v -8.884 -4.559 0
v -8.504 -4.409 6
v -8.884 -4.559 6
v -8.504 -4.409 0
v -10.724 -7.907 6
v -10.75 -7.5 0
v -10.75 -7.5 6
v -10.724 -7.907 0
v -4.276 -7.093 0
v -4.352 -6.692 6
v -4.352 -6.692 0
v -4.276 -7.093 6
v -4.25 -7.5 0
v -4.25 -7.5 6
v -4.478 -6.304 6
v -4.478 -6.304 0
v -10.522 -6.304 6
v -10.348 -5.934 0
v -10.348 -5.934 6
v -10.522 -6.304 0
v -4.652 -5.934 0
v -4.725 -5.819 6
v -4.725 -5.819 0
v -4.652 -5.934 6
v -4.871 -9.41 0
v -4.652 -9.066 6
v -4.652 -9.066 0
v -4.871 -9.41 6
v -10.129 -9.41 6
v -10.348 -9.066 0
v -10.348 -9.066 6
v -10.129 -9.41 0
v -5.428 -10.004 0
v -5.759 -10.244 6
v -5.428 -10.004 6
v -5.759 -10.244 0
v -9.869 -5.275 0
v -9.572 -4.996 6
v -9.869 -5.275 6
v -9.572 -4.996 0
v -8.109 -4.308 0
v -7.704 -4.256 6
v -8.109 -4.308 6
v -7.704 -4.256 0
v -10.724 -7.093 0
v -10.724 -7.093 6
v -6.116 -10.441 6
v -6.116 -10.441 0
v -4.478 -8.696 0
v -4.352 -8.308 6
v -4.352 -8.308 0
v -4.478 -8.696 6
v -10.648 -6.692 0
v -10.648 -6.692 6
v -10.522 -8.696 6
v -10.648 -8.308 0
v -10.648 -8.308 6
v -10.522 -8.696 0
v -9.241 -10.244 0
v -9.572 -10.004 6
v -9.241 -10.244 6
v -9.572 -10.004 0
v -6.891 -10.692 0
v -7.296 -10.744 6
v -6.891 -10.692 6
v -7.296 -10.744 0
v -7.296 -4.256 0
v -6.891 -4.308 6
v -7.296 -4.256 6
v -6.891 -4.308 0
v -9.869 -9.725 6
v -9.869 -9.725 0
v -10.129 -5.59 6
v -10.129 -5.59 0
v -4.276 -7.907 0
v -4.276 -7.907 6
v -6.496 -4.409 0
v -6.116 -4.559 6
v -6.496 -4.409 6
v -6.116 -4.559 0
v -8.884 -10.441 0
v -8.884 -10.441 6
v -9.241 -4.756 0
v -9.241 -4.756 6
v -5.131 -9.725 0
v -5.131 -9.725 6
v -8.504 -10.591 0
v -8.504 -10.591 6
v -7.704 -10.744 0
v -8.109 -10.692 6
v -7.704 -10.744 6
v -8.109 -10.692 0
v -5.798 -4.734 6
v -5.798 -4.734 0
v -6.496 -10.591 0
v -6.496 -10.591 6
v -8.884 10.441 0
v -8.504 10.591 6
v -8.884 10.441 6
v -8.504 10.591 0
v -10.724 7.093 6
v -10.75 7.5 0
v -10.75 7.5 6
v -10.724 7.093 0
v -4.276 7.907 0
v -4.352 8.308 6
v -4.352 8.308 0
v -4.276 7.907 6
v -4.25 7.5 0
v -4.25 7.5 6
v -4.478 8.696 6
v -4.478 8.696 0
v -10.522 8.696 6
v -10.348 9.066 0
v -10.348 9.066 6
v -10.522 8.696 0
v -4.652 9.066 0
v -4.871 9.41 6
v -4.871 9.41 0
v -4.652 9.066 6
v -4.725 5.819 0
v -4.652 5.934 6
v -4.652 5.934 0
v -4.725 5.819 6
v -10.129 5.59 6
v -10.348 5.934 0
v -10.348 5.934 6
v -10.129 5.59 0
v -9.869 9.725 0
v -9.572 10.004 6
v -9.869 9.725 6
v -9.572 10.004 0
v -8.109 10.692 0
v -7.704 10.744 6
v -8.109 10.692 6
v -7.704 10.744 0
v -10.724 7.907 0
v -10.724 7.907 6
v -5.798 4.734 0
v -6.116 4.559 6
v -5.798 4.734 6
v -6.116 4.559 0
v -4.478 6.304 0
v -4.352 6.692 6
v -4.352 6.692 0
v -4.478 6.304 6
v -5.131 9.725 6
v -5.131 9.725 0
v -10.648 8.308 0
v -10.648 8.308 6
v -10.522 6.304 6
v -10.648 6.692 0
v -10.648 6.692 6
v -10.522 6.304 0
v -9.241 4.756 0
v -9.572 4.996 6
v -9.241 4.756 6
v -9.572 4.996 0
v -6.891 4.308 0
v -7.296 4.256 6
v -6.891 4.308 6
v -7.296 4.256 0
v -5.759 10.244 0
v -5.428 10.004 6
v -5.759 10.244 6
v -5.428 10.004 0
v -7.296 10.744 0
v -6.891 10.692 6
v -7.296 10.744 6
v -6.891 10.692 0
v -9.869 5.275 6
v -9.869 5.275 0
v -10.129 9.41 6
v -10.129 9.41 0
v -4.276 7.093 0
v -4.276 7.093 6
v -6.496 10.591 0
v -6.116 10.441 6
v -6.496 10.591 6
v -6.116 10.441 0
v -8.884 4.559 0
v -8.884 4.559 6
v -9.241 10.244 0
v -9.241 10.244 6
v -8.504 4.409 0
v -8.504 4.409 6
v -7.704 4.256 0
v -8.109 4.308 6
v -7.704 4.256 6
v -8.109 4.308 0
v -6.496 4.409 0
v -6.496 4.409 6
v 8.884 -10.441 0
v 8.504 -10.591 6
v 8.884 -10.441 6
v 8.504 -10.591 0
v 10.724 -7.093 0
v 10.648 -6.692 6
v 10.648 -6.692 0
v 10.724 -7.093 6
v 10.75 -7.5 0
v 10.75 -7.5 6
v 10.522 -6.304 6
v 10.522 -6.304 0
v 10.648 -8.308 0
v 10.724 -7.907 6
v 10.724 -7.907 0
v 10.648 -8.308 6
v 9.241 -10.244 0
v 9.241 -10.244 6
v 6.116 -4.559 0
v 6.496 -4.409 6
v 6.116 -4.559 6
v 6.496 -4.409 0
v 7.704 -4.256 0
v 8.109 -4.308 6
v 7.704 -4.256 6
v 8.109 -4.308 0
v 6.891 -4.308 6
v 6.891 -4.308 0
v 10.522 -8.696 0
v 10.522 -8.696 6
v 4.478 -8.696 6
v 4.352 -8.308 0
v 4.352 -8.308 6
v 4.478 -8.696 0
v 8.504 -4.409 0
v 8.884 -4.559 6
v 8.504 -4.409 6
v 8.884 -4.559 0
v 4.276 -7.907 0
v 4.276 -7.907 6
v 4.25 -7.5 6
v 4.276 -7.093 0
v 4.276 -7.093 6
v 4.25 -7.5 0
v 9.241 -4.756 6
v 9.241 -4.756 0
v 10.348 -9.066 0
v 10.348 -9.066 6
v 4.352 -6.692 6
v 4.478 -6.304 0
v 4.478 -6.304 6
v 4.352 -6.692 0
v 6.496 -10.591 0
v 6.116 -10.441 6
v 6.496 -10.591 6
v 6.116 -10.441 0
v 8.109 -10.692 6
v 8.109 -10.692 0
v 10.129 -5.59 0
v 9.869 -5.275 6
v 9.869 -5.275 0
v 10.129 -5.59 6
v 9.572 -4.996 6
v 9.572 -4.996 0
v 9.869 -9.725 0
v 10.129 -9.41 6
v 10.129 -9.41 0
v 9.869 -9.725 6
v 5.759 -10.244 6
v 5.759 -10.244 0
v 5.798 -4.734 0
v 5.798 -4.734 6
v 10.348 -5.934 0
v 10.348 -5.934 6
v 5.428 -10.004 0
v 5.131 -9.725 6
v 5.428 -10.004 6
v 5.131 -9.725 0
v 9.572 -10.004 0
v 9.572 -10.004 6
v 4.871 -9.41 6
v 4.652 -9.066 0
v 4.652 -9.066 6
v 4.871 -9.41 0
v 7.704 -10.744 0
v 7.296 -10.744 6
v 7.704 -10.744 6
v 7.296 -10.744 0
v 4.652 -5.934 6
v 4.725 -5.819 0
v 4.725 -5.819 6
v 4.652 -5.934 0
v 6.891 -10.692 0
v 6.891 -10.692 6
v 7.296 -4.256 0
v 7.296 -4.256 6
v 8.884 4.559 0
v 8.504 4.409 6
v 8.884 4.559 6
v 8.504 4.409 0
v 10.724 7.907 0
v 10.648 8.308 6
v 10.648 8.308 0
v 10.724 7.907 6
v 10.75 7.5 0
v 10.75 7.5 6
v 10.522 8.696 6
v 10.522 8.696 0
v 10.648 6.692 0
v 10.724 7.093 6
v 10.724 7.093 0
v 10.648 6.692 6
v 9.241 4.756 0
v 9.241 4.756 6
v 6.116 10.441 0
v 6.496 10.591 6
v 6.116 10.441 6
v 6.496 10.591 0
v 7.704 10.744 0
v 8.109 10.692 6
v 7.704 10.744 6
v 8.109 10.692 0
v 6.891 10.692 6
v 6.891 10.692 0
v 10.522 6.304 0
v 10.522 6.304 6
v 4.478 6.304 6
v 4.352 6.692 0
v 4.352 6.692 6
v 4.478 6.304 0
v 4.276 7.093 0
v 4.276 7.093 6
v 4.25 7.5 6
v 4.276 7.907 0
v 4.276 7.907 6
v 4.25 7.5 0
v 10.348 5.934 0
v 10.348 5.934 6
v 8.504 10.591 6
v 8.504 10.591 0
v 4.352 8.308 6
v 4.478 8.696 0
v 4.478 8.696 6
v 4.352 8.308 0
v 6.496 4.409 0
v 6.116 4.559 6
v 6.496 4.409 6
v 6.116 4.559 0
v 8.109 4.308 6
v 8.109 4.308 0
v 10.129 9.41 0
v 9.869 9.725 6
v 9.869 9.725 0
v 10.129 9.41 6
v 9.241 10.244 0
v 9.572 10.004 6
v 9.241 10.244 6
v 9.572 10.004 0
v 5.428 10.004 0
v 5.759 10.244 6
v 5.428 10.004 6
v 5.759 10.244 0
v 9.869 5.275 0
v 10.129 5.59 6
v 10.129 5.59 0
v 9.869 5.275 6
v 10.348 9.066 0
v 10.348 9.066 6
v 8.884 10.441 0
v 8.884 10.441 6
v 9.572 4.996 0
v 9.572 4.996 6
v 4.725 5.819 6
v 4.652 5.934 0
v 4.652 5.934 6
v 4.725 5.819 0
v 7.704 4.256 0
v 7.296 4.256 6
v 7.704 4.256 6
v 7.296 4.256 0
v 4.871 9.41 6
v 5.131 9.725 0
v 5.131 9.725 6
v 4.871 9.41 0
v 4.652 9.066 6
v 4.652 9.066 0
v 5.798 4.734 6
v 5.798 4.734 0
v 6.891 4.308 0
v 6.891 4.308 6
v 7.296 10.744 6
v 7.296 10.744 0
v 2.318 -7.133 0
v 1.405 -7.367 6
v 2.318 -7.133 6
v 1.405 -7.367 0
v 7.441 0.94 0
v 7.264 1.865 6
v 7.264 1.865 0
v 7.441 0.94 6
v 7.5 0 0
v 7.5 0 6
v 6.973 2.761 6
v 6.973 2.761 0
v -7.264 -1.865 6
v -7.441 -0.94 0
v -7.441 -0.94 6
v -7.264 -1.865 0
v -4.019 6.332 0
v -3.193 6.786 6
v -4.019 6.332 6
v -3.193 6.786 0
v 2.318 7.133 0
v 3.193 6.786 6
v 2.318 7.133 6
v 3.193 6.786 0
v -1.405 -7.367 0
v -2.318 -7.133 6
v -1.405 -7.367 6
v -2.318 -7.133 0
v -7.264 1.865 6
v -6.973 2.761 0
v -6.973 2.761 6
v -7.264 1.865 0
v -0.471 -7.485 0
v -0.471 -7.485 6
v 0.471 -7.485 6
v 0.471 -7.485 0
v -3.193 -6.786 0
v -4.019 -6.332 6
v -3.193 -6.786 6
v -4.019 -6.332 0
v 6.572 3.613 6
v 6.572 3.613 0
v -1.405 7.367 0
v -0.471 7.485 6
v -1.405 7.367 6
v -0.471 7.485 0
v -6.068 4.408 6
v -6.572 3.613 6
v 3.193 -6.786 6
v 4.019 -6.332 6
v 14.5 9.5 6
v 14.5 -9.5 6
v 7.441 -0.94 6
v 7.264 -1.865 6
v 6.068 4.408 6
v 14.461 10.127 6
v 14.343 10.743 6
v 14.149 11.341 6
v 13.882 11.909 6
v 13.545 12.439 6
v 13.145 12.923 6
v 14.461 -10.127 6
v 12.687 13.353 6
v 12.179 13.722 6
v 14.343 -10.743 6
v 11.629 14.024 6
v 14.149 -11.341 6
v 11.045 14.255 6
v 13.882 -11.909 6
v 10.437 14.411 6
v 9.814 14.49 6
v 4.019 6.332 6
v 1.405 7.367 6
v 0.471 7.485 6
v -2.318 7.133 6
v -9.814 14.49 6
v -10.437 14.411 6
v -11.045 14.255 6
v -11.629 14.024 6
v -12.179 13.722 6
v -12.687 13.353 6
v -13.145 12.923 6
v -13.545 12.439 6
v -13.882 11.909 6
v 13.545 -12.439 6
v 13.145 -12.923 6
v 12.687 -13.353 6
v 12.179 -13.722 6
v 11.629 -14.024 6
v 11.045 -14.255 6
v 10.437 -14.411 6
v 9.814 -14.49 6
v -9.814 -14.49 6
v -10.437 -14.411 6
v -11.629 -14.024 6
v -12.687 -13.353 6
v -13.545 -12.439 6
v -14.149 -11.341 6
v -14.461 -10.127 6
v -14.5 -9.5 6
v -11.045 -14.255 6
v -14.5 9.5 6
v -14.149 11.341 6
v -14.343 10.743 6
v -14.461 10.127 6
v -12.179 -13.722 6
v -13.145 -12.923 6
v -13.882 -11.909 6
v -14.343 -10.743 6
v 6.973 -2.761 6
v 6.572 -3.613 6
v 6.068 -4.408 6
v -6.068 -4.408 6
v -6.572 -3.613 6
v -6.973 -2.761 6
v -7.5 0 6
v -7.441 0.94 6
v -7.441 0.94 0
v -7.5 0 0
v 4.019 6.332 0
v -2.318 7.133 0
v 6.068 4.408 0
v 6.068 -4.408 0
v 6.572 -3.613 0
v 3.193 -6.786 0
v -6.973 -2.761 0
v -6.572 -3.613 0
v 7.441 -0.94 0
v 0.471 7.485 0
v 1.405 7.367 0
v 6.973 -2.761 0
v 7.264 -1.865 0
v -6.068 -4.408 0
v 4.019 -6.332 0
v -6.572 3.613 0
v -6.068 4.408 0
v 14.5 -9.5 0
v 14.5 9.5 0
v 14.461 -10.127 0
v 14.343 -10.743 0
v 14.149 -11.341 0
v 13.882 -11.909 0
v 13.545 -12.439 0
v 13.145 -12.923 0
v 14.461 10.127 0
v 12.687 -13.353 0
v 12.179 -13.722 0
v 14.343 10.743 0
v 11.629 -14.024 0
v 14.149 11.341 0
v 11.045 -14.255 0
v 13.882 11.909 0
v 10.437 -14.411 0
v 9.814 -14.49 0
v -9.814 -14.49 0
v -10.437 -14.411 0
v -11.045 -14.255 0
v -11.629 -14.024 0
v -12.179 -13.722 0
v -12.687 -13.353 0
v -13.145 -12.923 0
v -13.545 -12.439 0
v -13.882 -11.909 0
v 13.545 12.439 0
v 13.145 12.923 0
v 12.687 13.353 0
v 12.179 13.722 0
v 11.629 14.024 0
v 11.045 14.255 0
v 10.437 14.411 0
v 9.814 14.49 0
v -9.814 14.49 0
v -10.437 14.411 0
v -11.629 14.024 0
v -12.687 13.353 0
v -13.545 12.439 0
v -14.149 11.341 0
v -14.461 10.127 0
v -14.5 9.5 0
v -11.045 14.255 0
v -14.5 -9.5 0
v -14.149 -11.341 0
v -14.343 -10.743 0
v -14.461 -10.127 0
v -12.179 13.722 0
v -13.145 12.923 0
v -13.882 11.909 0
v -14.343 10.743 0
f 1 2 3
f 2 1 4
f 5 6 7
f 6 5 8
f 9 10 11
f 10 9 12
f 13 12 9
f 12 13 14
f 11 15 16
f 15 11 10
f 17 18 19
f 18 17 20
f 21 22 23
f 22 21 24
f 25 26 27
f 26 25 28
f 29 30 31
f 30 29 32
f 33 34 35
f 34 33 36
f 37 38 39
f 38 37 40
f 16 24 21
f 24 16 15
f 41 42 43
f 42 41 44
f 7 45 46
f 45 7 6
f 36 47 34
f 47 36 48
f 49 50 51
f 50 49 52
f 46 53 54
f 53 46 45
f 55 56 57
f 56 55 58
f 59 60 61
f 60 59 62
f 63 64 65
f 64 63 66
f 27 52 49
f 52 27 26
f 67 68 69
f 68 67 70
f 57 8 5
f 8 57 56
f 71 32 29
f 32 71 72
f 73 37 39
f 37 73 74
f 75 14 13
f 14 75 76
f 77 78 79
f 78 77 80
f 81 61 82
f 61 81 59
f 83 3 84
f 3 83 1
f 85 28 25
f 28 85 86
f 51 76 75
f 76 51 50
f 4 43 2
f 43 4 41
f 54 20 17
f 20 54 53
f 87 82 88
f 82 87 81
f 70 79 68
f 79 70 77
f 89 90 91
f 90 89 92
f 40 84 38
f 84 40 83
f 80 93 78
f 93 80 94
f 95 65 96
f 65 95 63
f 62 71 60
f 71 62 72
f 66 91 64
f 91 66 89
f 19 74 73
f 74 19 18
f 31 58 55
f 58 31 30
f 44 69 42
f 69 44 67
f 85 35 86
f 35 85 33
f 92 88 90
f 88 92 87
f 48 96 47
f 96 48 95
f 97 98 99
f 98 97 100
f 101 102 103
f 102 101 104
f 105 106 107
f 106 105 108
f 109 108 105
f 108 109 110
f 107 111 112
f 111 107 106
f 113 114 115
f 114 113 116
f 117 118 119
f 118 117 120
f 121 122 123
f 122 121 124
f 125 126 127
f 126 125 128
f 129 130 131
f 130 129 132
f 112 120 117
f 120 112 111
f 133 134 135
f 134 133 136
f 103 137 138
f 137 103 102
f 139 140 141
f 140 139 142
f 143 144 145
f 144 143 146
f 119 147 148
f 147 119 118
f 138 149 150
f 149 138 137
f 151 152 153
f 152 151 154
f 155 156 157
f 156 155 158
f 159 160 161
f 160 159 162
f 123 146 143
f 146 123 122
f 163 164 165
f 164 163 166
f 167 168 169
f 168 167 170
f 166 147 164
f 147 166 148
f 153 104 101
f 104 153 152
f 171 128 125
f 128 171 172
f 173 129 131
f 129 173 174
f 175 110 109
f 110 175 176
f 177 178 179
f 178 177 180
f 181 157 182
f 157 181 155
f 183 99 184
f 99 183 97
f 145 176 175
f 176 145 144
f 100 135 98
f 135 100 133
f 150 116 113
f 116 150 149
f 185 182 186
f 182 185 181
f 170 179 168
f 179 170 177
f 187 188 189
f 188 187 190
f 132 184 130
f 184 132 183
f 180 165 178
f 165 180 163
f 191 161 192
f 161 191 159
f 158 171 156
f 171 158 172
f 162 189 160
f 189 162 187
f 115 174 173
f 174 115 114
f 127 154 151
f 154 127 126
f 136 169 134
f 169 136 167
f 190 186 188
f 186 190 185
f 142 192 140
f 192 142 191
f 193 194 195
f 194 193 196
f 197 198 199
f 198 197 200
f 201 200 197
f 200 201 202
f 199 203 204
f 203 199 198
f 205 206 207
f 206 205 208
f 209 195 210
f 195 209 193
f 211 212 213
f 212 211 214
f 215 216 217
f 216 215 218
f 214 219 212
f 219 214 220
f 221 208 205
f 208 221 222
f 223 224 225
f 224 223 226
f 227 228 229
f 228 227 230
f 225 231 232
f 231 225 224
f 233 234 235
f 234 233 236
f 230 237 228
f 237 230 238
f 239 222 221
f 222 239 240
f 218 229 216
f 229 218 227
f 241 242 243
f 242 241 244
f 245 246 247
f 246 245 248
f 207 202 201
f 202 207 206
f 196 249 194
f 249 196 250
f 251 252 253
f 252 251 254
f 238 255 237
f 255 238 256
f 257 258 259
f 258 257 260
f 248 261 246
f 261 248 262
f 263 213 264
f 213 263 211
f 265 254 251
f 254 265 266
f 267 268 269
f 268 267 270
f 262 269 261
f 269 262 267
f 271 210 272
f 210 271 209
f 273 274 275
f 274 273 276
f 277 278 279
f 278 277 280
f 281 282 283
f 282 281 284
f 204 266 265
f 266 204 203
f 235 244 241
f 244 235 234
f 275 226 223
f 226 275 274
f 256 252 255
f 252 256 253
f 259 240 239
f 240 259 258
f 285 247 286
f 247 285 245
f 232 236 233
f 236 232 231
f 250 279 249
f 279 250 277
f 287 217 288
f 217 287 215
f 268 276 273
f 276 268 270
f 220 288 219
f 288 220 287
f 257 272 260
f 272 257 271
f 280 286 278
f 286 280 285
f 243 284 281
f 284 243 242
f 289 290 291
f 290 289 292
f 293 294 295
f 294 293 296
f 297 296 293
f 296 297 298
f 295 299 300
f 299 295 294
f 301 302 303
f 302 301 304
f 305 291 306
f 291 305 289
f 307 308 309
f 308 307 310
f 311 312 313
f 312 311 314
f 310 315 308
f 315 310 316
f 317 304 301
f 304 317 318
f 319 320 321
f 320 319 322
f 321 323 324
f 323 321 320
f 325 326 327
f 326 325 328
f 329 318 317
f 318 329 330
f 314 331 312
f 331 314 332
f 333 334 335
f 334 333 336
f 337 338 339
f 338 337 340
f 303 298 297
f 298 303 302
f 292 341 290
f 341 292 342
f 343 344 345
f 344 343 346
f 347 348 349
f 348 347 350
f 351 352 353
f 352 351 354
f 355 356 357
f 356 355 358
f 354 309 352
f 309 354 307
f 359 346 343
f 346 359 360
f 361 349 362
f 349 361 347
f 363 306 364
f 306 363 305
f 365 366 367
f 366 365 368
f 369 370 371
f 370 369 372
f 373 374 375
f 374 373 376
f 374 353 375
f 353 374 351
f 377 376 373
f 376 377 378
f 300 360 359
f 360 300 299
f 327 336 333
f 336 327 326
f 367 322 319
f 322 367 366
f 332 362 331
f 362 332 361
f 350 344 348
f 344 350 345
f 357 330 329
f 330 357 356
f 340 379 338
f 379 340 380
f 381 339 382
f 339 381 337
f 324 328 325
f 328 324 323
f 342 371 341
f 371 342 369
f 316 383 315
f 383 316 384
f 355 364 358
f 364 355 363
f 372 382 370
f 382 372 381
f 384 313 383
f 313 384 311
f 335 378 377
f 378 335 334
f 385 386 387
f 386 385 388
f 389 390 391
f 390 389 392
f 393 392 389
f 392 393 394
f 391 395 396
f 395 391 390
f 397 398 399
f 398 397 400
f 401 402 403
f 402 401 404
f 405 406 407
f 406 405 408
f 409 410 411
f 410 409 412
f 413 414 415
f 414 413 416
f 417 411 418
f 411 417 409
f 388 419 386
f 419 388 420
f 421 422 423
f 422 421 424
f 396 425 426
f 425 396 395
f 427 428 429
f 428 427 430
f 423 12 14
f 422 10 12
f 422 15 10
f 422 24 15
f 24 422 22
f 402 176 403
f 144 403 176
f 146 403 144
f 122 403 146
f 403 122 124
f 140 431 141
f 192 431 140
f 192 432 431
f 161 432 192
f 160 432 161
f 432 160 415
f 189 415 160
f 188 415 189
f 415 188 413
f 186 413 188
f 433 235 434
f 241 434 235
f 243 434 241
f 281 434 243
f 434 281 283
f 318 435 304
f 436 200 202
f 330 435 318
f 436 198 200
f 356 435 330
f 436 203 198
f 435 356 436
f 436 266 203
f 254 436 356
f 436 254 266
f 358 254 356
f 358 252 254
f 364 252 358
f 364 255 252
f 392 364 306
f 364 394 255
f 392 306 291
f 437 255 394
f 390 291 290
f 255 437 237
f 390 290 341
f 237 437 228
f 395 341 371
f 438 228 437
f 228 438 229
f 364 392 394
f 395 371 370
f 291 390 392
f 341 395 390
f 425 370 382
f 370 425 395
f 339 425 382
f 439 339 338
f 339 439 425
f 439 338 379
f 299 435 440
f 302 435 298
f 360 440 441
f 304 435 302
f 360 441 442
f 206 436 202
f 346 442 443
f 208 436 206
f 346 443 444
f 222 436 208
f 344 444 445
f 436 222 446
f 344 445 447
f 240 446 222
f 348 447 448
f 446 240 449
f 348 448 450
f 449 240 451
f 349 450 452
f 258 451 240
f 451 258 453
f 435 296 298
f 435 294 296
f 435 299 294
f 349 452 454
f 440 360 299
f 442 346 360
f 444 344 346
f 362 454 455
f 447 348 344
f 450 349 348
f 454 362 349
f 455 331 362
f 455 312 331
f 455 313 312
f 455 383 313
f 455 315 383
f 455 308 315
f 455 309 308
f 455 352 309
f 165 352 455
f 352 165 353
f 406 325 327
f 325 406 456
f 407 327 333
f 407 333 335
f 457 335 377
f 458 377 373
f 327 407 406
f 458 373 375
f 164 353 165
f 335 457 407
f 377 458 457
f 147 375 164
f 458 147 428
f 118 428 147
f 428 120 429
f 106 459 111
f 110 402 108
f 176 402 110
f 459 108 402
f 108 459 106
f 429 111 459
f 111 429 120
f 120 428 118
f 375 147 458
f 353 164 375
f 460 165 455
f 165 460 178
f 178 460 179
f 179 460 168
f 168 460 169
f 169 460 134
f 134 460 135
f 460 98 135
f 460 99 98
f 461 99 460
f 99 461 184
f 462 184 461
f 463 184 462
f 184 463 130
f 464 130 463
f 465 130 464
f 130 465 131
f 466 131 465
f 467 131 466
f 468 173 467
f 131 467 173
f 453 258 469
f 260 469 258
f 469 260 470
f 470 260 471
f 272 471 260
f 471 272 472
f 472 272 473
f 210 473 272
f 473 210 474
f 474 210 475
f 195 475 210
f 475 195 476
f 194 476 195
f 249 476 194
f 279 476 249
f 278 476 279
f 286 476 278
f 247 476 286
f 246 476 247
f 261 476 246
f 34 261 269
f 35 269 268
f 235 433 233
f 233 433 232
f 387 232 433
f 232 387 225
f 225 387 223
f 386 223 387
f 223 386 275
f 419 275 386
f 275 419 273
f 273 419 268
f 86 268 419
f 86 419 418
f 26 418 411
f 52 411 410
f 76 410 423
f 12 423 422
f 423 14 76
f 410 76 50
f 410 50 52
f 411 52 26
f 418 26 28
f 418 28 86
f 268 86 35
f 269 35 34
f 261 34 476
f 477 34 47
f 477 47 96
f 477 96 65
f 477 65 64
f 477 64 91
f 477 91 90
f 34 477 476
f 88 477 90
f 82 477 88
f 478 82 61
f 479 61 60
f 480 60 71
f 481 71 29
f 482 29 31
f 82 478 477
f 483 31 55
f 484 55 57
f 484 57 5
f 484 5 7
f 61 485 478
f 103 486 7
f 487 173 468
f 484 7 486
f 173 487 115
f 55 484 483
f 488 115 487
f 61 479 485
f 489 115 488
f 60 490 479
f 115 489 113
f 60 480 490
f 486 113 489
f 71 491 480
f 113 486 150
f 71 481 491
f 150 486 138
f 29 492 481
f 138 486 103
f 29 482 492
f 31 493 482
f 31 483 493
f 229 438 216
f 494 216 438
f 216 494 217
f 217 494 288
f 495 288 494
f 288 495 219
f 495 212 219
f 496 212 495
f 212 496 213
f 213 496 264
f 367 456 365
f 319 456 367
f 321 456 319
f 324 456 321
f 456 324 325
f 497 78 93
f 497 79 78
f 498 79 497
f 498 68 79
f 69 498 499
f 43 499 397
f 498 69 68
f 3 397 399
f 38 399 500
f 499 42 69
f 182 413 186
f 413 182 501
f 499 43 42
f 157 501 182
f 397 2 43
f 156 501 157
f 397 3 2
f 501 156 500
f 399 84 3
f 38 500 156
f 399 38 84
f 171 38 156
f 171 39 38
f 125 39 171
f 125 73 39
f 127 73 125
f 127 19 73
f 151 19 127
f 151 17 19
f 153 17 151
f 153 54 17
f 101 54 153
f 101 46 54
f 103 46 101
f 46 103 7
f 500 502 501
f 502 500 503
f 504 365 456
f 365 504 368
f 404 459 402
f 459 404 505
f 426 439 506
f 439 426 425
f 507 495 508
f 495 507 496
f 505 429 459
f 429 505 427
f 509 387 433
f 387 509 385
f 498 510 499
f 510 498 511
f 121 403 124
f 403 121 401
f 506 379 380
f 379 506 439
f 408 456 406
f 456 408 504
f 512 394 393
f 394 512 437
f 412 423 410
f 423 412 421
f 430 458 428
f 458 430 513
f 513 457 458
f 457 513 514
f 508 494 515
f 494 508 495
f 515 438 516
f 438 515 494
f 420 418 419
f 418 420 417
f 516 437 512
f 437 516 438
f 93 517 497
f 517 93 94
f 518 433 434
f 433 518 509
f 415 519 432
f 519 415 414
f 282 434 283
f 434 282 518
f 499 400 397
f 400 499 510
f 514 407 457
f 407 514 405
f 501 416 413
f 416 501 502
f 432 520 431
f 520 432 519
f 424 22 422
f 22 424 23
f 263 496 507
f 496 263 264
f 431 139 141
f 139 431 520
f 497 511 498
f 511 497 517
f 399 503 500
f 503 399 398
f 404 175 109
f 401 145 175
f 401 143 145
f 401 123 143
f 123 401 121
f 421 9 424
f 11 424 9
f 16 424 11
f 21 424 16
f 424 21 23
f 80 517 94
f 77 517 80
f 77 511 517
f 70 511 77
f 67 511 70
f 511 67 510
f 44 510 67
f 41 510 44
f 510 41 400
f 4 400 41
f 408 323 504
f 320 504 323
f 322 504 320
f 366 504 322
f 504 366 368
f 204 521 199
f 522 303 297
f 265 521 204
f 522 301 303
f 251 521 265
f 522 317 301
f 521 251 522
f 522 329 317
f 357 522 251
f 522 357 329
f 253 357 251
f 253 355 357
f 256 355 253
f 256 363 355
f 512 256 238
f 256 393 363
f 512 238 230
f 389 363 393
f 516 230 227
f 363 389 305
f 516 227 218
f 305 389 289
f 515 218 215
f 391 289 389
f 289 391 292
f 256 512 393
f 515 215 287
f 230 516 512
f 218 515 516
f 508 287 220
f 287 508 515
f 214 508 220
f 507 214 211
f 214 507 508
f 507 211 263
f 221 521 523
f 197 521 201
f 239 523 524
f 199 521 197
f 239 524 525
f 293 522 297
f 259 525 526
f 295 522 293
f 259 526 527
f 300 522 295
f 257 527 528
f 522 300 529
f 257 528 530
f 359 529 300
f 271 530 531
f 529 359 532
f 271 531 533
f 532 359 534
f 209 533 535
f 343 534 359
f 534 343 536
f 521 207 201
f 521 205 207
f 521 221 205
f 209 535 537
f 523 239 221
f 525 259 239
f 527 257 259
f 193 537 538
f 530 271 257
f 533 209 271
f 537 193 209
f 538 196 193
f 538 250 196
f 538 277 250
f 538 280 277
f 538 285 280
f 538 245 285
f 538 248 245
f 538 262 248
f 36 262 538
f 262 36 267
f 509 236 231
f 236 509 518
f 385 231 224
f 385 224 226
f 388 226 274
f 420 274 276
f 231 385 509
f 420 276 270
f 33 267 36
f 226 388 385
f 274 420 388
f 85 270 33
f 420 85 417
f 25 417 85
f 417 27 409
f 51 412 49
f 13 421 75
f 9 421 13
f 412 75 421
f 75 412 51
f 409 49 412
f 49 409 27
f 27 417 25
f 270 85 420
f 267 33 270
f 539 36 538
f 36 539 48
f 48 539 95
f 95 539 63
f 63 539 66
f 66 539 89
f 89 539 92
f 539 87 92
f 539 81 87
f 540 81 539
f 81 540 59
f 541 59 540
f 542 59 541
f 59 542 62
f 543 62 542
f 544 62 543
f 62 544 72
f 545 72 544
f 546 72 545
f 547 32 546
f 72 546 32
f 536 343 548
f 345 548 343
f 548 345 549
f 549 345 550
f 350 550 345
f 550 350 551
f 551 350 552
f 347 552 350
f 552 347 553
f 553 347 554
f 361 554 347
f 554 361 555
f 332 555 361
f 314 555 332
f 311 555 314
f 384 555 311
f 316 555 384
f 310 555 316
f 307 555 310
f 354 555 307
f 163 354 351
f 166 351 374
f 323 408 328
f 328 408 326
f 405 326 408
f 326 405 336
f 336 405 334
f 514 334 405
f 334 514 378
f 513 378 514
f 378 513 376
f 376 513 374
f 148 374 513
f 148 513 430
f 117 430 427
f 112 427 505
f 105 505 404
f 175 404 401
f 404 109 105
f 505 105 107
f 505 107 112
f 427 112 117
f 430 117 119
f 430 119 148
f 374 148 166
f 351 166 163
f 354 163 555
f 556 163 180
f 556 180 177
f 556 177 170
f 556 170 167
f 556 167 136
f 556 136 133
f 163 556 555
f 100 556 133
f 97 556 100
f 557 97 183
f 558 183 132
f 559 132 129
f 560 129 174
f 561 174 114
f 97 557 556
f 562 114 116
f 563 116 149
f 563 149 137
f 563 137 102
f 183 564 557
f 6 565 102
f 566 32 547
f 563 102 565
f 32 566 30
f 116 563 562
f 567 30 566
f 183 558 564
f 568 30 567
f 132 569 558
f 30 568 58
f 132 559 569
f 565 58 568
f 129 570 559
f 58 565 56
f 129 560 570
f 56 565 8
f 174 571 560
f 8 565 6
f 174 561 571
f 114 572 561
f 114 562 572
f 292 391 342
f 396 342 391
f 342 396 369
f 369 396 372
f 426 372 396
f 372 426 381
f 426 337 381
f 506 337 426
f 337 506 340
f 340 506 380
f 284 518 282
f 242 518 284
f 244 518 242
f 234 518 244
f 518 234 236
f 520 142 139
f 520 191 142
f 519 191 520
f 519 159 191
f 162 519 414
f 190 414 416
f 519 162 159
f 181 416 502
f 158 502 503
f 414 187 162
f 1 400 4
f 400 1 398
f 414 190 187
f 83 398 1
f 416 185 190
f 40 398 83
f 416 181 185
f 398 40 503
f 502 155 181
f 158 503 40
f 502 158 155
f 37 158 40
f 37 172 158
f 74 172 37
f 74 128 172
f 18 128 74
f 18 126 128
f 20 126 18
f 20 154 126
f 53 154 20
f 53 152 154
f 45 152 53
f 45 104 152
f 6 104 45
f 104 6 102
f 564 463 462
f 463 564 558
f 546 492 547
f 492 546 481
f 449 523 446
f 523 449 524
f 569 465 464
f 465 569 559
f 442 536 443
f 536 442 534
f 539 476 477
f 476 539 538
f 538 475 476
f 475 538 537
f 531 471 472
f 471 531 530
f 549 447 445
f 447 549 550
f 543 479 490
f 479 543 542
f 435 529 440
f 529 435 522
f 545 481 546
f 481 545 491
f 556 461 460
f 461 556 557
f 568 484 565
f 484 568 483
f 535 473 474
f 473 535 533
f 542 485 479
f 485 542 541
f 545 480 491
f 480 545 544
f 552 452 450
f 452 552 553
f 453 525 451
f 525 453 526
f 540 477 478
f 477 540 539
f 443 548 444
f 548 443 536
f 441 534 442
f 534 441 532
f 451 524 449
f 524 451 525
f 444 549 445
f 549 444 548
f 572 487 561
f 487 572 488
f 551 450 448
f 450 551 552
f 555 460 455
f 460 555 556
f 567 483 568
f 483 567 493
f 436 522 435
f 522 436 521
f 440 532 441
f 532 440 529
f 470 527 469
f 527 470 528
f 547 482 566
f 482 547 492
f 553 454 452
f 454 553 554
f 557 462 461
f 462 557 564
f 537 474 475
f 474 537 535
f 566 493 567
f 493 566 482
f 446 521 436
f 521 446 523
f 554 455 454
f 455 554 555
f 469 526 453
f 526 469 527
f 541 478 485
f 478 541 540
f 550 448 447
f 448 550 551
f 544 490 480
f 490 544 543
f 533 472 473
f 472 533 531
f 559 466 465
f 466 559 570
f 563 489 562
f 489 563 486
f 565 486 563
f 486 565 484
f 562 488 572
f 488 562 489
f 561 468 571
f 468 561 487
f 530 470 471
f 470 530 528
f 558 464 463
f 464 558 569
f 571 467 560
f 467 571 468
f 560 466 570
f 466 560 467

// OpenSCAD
$fn = 50;

difference() {
	union() {
		hull() {
			translate(v = [-9.5, 9.5, 0]) {
				cylinder(h = 6, r = 5);
			}
			translate(v = [9.5, 9.5, 0]) {
				cylinder(h = 6, r = 5);
			}
			translate(v = [-9.5, -9.5, 0]) {
				cylinder(h = 6, r = 5);
			}
			translate(v = [9.5, -9.5, 0]) {
				cylinder(h = 6, r = 5);
			}
		}
	}
	union() {
		translate(v = [-7.5, -7.5, -100.0]) {
			cylinder(h = 200, r = 3.25);
		}
		translate(v = [-7.5, 7.5, -100.0]) {
			cylinder(h = 200, r = 3.25);
		}
		translate(v = [7.5, -7.5, -100.0]) {
			cylinder(h = 200, r = 3.25);
		}
		translate(v = [7.5, 7.5, -100.0]) {
			cylinder(h = 200, r = 3.25);
		}
		translate(v = [-7.5, -7.5, -100.0]) {
			cylinder(h = 200, r = 1.8);
		}
		translate(v = [-7.5, 7.5, -100.0]) {
			cylinder(h = 200, r = 1.8);
		}
		translate(v = [7.5, -7.5, -100.0]) {
			cylinder(h = 200, r = 1.8);
		}
		translate(v = [7.5, 7.5, -100.0]) {
			cylinder(h = 200, r = 1.8);
		}
		cylinder(h = 6, r = 7.5);
	}
}
